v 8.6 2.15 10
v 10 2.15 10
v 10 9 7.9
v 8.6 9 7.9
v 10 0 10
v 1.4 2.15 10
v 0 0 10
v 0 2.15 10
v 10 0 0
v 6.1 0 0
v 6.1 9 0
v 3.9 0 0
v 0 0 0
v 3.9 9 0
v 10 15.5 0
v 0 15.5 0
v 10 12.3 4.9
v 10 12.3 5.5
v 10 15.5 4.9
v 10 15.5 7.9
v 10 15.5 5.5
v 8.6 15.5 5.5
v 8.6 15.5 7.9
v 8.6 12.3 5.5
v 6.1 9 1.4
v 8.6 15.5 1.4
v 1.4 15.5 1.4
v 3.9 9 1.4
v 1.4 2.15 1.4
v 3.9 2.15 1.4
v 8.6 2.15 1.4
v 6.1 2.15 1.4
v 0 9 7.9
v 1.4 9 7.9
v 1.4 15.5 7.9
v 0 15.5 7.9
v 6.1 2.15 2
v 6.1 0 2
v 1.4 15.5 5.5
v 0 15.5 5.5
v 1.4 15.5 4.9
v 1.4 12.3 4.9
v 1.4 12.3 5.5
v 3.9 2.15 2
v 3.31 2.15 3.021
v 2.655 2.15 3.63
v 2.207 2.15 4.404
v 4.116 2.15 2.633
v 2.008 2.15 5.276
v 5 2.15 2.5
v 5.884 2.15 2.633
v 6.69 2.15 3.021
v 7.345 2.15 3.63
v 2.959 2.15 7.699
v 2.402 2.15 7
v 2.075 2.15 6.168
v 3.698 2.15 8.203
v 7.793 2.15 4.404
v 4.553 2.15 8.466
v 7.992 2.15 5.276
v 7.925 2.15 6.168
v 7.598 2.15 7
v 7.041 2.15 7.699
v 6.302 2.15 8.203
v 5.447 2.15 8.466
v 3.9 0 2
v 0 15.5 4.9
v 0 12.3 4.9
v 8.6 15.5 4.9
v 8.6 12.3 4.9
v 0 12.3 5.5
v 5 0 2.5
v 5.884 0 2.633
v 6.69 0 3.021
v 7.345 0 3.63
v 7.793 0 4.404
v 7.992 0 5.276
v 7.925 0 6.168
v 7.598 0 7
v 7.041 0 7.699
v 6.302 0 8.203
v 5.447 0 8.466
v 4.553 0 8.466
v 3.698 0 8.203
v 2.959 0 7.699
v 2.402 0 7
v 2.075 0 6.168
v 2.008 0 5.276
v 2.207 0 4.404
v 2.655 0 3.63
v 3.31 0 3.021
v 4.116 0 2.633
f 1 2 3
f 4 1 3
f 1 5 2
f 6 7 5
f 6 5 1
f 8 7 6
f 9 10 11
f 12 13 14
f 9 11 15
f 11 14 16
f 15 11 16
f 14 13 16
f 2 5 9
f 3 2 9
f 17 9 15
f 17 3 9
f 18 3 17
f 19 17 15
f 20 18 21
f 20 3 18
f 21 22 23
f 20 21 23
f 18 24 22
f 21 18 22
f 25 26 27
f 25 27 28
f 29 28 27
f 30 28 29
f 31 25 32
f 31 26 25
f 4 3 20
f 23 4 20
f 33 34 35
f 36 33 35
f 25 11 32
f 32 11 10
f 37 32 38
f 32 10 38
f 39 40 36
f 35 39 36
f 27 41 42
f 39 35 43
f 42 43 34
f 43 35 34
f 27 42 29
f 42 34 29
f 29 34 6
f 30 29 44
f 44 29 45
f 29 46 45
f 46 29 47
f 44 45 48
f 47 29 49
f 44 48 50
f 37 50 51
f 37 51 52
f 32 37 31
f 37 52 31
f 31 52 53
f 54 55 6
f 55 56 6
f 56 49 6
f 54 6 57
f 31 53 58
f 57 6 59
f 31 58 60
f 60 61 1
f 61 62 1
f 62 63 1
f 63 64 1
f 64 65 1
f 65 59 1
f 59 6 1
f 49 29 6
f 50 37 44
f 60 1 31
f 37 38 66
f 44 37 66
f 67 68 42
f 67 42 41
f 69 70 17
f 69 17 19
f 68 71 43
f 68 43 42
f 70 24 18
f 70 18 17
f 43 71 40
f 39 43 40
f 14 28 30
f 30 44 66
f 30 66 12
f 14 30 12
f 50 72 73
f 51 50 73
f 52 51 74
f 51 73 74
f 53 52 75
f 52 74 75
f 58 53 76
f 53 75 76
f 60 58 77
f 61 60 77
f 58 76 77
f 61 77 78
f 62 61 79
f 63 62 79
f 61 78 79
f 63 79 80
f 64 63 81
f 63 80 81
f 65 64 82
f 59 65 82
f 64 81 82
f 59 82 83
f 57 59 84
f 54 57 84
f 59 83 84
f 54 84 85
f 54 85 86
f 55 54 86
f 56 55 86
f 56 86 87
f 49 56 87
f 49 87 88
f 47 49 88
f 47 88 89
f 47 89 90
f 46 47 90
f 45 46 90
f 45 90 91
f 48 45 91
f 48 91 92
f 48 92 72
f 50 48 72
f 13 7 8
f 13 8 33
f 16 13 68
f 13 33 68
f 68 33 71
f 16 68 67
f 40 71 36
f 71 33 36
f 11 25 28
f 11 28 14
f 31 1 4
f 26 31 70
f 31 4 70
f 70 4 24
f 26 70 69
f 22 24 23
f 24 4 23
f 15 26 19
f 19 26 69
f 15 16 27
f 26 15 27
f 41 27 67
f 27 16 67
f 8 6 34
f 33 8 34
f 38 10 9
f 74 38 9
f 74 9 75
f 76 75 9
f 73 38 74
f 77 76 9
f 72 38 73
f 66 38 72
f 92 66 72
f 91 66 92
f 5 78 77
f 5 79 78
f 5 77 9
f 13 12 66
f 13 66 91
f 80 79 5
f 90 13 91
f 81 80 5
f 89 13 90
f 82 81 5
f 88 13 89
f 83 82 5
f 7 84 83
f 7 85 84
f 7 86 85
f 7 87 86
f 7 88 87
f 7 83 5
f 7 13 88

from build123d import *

# Parameters (mm, degrees)
SKETCH_W        = 15.5
SKETCH_H        = 10
PAD_DEPTH       = 10
POCKET_DEPTH    = 9
POCKET001_DEPTH = 10
POCKET002_DEPTH = 8.6
SKETCH002_R     = 3
HOLE_DEPTH      = 25
SKETCH012_W     = 3.2
SKETCH012_H     = 0.6
POCKET004_DEPTH = 10


with BuildPart() as part:
    # Sketch → Pad (new body)
    with BuildSketch(Plane.YZ):
        with Locations((7.75, 5)):
            Rectangle(SKETCH_W, SKETCH_H)
    extrude(amount=PAD_DEPTH)

    # Sketch001 (on Face1 of Pad) → Pocket (cut)
    with BuildSketch(Plane(origin=(0, 0, 0), x_dir=(0, 0, -1), z_dir=(0, -1, 0))):
        Polygon((-2, 6.1), (-2, 3.9), (0, 3.9), (0, 5), (0, 6.1), align=None)
    extrude(amount=-POCKET_DEPTH, mode=Mode.SUBTRACT)

    # Sketch003 → Pocket001 (cut)
    with BuildSketch(Plane.YZ.offset(10)):
        Polygon((2.15, 10), (9, 7.9), (15.5, 7.9), (15.5, 10), align=None)
    extrude(amount=-POCKET001_DEPTH, mode=Mode.SUBTRACT)

    # Sketch004 (on Face4 of Pad) → Pocket002 (cut)
    with BuildSketch(Plane(origin=(0, 0, 10), x_dir=(0, -1, 0), z_dir=(0, 0, 1))):
        Polygon((-15.5, 8.6), (-15.5, 5), (-15.5, 1.4), (-2.15, 1.4), (-2.15, 8.6), align=None)
    extrude(amount=-POCKET002_DEPTH, mode=Mode.SUBTRACT)

    # Sketch002 (on Face1 of Pocket) → Hole (cut)
    with BuildSketch(Plane(origin=(0, 0, 0), x_dir=(0, 0, -1), z_dir=(0, -1, 0))):
        with Locations((-5.5, 5)):
            Circle(SKETCH002_R)
    extrude(amount=-HOLE_DEPTH, mode=Mode.SUBTRACT)

    # Sketch012 (on Face2 of Hole) → Pocket004 (cut)
    with BuildSketch(Plane(origin=(0, 0, 0), x_dir=(0, 1, 0), z_dir=(-1, 0, 0))):
        with Locations((13.9, -5.2)):
            Rectangle(SKETCH012_W, SKETCH012_H)
    extrude(amount=-POCKET004_DEPTH, mode=Mode.SUBTRACT)


solid = part.part
